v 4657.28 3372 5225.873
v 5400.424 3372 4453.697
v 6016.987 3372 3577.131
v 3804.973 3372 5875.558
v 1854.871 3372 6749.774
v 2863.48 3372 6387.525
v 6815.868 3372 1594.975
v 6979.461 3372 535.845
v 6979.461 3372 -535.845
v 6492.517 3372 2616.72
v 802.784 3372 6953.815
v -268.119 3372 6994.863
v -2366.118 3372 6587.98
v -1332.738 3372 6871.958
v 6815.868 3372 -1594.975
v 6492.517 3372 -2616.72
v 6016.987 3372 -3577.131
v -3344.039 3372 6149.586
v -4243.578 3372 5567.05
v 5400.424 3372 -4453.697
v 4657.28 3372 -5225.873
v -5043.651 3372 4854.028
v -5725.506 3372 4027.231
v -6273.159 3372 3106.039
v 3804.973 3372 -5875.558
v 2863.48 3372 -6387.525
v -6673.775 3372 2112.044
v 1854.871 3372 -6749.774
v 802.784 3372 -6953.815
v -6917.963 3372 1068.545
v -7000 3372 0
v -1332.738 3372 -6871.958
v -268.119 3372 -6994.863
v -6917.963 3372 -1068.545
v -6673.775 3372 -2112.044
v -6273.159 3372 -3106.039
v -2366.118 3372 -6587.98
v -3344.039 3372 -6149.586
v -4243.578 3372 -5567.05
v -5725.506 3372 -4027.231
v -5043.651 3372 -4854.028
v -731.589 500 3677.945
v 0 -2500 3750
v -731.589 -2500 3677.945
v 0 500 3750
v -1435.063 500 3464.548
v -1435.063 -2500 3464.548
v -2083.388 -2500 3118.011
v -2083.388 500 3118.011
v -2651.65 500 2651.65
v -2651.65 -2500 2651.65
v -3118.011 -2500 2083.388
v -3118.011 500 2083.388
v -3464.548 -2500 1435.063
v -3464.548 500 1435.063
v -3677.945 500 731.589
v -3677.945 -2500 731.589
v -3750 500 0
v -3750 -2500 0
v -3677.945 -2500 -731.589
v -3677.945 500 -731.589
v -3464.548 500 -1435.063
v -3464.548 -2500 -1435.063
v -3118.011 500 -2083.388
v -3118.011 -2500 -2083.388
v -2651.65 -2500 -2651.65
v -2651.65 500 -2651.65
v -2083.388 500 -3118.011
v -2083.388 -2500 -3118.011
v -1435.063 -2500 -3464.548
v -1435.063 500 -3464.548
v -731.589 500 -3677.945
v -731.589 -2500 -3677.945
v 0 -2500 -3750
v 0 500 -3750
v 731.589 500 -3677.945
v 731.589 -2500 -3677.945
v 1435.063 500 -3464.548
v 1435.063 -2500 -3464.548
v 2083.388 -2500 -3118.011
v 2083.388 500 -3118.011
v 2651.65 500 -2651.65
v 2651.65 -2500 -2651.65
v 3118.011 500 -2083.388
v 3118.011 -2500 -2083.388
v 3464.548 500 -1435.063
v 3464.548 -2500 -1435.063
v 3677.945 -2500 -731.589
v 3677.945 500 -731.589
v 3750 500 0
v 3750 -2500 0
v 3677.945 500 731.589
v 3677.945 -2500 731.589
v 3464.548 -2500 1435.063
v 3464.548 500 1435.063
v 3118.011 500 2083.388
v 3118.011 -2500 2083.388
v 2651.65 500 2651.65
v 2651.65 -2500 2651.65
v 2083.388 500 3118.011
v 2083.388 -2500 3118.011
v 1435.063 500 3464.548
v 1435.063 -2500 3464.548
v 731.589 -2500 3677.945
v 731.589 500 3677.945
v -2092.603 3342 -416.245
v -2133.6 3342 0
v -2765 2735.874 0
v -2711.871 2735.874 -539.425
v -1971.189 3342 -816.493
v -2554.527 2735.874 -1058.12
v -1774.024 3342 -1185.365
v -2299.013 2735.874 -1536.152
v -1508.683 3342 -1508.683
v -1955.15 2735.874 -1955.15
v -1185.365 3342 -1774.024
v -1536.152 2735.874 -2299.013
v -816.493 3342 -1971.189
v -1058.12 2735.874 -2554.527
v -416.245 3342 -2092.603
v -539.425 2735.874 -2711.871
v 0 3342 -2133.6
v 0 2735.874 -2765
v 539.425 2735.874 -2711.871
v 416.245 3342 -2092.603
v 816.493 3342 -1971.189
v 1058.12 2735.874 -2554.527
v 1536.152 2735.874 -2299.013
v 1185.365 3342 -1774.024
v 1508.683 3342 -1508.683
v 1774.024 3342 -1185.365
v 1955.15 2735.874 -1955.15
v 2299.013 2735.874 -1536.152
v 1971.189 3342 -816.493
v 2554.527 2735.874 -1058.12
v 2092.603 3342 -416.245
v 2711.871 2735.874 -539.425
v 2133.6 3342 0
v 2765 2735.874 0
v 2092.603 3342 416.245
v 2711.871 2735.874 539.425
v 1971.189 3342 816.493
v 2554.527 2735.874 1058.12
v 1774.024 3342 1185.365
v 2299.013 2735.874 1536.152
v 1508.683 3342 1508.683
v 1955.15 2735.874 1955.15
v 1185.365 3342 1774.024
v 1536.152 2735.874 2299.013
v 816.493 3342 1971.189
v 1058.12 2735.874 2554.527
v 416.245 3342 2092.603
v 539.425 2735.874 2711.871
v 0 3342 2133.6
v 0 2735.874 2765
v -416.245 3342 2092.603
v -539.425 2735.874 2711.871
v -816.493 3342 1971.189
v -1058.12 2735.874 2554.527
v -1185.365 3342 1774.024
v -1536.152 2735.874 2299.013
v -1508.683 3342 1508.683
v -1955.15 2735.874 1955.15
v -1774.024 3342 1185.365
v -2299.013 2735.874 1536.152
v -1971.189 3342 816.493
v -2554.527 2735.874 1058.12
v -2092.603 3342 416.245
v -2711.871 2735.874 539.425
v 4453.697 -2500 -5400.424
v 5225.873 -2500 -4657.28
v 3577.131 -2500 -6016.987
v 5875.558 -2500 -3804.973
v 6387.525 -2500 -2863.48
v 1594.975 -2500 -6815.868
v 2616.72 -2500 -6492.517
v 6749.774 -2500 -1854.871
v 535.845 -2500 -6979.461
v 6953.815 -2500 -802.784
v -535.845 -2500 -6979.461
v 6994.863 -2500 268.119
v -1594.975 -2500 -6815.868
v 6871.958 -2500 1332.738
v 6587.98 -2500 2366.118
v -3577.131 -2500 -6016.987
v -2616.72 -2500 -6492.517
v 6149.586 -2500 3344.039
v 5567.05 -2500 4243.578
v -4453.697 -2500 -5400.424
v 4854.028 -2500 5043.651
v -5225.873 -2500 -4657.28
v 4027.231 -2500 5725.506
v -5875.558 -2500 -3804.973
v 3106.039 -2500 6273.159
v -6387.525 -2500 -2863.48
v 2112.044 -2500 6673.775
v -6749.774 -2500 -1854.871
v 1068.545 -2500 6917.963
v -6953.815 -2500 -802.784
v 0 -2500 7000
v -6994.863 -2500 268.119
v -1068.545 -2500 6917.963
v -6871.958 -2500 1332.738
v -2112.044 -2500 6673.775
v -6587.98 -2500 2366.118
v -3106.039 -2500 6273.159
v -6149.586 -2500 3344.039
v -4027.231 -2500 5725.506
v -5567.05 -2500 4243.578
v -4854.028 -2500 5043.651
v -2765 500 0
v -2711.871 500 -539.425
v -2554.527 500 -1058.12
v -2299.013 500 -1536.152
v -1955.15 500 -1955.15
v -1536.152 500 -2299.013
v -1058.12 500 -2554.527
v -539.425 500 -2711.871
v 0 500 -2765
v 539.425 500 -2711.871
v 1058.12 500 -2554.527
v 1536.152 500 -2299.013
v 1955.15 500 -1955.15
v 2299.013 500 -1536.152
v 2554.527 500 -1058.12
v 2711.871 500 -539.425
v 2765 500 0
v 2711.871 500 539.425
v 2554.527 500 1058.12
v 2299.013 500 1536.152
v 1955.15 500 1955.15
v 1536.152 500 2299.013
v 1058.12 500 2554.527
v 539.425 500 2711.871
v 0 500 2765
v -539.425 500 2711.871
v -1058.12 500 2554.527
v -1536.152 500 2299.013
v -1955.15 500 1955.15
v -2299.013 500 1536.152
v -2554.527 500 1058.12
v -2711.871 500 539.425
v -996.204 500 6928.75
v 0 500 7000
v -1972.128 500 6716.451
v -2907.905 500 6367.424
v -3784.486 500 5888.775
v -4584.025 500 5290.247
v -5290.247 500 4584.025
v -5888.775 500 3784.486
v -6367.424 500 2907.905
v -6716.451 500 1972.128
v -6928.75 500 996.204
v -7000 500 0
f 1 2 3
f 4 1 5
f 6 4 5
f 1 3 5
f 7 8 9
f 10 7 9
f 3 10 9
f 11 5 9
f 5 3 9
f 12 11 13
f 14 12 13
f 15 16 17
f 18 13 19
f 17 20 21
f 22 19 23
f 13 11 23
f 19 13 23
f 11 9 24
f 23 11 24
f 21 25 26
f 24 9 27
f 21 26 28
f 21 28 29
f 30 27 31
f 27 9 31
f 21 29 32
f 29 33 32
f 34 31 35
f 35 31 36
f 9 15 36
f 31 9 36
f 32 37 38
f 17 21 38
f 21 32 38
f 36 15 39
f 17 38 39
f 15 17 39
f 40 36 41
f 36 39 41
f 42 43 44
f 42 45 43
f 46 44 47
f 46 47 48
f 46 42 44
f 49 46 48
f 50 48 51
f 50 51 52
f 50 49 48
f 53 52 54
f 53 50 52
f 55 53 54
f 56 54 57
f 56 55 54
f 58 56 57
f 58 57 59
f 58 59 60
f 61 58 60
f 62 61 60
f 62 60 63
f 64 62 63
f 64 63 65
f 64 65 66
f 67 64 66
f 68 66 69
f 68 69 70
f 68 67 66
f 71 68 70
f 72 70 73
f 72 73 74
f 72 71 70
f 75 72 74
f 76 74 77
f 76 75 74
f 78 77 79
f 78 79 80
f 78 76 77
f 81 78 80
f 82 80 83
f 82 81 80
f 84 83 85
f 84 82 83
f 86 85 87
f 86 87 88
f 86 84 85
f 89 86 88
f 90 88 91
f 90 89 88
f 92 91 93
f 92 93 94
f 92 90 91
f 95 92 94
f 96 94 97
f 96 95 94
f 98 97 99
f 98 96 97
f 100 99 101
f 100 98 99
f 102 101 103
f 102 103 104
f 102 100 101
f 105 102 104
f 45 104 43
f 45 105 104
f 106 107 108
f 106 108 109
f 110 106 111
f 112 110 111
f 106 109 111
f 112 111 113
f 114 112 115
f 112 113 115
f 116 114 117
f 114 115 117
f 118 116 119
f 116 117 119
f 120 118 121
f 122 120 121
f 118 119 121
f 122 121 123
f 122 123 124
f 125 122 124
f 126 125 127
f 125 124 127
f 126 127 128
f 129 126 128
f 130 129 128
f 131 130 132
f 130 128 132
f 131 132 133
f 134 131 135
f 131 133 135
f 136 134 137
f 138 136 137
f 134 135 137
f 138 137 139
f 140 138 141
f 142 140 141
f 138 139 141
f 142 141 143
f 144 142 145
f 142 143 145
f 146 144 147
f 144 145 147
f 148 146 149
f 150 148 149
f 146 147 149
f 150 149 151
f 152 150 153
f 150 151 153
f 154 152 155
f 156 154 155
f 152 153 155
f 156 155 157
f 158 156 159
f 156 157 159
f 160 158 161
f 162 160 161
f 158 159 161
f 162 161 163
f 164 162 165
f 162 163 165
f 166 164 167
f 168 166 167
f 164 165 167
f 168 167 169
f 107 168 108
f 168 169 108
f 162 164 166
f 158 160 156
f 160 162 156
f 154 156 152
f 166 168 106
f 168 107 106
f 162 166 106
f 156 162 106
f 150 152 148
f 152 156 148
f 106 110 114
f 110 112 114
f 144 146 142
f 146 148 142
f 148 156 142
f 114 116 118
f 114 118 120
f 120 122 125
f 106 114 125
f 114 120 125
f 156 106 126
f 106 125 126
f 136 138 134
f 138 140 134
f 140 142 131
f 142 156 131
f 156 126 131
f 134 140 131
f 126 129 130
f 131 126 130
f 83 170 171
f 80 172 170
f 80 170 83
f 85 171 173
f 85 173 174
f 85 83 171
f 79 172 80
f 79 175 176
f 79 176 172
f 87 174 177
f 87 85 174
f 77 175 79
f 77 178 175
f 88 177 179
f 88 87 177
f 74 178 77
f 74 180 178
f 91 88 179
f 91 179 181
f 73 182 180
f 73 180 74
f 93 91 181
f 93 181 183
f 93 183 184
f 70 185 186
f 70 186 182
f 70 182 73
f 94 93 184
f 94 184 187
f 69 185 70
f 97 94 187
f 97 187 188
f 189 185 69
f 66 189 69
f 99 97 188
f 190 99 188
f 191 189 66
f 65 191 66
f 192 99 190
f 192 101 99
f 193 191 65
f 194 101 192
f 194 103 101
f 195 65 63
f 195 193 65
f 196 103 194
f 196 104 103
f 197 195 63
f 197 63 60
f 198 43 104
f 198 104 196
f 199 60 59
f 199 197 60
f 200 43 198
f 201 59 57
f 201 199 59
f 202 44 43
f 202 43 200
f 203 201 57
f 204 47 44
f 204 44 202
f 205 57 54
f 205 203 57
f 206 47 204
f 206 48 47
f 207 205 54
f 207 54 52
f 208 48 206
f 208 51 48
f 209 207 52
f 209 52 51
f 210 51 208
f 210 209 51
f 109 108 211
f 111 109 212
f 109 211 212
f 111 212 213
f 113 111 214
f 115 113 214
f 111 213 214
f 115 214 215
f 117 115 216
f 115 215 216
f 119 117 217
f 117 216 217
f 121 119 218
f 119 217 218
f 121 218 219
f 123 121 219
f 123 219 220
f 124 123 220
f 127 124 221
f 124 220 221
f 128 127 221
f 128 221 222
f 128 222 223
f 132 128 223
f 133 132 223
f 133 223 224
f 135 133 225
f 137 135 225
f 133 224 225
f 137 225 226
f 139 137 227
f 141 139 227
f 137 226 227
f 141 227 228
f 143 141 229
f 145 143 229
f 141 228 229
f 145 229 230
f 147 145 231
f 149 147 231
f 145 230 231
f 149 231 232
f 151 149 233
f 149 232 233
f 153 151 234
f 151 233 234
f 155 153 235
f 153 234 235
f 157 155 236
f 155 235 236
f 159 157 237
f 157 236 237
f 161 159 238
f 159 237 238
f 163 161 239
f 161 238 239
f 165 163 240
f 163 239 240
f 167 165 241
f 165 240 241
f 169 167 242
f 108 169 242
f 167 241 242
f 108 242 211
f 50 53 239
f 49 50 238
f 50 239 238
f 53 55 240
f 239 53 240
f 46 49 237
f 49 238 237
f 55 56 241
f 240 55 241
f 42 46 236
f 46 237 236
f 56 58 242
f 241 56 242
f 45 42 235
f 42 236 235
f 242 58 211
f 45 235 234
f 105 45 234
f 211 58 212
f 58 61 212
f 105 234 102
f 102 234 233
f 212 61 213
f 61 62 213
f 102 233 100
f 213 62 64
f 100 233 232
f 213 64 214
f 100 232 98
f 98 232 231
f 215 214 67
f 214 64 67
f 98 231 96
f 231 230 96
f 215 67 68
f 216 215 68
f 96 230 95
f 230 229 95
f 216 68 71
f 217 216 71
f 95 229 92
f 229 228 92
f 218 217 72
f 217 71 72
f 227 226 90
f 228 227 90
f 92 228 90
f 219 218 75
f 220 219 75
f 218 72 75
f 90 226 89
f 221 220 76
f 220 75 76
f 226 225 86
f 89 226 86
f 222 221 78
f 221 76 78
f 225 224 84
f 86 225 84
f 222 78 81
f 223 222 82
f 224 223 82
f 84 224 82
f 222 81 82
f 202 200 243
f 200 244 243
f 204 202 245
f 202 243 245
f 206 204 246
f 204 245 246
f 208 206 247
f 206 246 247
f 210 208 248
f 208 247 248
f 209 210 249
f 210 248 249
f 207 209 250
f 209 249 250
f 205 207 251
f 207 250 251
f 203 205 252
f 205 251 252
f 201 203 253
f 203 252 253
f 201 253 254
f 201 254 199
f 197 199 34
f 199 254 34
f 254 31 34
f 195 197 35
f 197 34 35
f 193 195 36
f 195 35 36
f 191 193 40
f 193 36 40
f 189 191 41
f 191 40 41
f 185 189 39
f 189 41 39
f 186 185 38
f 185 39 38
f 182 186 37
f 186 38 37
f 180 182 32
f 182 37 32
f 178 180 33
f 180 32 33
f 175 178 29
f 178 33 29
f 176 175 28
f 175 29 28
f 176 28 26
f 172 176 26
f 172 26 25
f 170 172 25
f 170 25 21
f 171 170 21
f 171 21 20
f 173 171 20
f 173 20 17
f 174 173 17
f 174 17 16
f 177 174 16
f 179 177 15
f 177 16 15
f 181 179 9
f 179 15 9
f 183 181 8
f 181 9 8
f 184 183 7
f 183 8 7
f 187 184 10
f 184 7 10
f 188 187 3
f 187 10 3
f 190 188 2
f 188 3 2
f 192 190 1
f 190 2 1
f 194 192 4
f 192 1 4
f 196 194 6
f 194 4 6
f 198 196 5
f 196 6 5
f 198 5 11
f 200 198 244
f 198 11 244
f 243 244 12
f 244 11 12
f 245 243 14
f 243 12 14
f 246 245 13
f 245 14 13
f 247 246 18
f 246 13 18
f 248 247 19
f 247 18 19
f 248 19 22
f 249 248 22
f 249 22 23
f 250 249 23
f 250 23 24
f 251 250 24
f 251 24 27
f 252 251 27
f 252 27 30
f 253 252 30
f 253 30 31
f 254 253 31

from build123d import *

# Parameters (mm, degrees)
SKETCH3_W = 3250
SKETCH3_H = 3000


with BuildPart() as part:
    # Sketch2 → Revolve2 (revolve)
    with BuildSketch(Plane.XY):
        Polygon((-2765, 500), (-7000, 500), (-7000, 3372), (0, 3372), (0, 3342), (-2133.6, 3342), (-2765, 2735.874225372), align=None)
    revolve(axis=Axis((0, 3520.44, 0), (0, -1, 0)))

    # Sketch3 → Revolve3 (revolve)
    with BuildSketch(Plane(origin=(0, 0, 0), x_dir=(0, 0, -1), z_dir=(1, 0, 0))):
        with Locations((-5375, -1000)):
            Rectangle(SKETCH3_W, SKETCH3_H)
    revolve(axis=Axis((0, 3520.44, 0), (0, -1, 0)))


solid = part.part
